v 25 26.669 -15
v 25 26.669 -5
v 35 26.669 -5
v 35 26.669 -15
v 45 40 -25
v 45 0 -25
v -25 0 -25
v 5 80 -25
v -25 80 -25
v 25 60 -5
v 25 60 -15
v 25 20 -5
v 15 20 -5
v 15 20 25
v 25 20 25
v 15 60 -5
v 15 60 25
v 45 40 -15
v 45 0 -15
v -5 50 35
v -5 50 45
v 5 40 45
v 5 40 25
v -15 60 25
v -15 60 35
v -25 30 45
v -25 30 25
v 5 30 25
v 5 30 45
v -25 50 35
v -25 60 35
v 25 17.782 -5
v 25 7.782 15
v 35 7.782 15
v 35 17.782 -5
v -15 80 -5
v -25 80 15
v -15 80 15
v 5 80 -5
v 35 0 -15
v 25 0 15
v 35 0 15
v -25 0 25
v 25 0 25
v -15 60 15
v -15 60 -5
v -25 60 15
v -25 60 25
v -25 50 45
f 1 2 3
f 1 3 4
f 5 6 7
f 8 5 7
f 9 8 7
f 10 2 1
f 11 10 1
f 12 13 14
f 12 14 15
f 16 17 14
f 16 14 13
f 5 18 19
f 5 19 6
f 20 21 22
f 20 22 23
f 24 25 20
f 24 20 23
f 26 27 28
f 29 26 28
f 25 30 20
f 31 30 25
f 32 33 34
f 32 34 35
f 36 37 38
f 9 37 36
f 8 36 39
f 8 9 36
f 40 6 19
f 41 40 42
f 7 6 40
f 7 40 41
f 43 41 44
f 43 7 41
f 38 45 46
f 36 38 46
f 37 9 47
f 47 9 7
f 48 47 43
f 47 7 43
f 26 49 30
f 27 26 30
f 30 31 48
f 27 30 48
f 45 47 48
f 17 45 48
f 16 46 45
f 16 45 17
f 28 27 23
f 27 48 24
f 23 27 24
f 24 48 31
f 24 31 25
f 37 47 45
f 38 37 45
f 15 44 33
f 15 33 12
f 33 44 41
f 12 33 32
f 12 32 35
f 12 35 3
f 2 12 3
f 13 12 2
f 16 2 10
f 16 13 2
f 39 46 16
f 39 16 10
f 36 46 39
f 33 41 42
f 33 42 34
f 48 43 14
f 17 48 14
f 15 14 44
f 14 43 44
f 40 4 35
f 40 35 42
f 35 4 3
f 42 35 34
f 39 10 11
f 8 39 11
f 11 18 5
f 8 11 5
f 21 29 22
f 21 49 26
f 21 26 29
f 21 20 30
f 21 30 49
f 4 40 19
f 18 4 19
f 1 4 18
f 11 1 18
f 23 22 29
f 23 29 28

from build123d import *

# Parameters (mm, degrees)
SKETCH1_W           = 50
SKETCH1_H           = 50
BOSS_EXTRUDE1_DEPTH = 60
SKETCH2_W           = 10
SKETCH2_H           = 30
CUT_EXTRUDE1_DEPTH  = 40
SKETCH3_W           = 30
SKETCH3_H           = 20
BOSS_EXTRUDE2_DEPTH = 30
CHAMFER1_SIZE       = 20
SKETCH4_W           = 10
SKETCH4_H           = 10
CUT_EXTRUDE2_DEPTH  = 40
SKETCH6_W           = 10
SKETCH6_H           = 80
BOSS_EXTRUDE3_DEPTH = 20
BOSS_EXTRUDE4_DEPTH = 20
CHAMFER2_SIZE       = 40
BOSS_EXTRUDE5_DEPTH = 10


with BuildPart() as part:
    # Sketch1 → Boss-Extrude1 (new body)
    with BuildSketch(Plane(origin=(0, 0, 0), x_dir=(1, 0, 0), z_dir=(0, 1, 0))):
        Rectangle(SKETCH1_W, SKETCH1_H)
    extrude(amount=BOSS_EXTRUDE1_DEPTH)

    # Sketch2 → Cut-Extrude1 (cut)
    with BuildSketch(Plane(origin=(0, 60, 0), x_dir=(1, 0, 0), z_dir=(0, 1, 0))):
        with Locations((20, -10)):
            Rectangle(SKETCH2_W, SKETCH2_H)
    extrude(amount=-CUT_EXTRUDE1_DEPTH, mode=Mode.SUBTRACT)

    # Sketch6 → Boss-Extrude3 (add)
    with BuildSketch(Plane(origin=(25, 0, 0), x_dir=(0, 0, -1), z_dir=(1, 0, 0))):
        with Locations((20, 40)):
            Rectangle(SKETCH6_W, SKETCH6_H)
    extrude(amount=BOSS_EXTRUDE3_DEPTH)

    # Sketch7 → Boss-Extrude4 (add)
    with BuildSketch(Plane(origin=(0, 60, 0), x_dir=(1, 0, 0), z_dir=(0, 1, 0))):
        Polygon((-25, -15), (-15, -15), (-15, 5), (25, 5), (25, 15), (25, 25), (-25, 25), align=None)
    extrude(amount=BOSS_EXTRUDE4_DEPTH)

    # Chamfer2
    chamfer2_edges = [part.edges().sort_by_distance(p)[0] for p in [
        (45, 80, -20),
    ]]
    chamfer(chamfer2_edges, length=CHAMFER2_SIZE)

    # Sketch8 → Boss-Extrude5 (add)
    with BuildSketch(Plane(origin=(25, 0, 0), x_dir=(0, 0, -1), z_dir=(1, 0, 0))):
        Polygon((15, 26.66931211), (15, 0), (-15, 0), (-15, 7.782203516), (5, 17.782203516), (5, 26.66931211), align=None)
    extrude(amount=BOSS_EXTRUDE5_DEPTH)


with BuildPart() as body_2:
    # Sketch3 → Boss-Extrude2 (new body)
    with BuildSketch(Plane(origin=(0, 60, 0), x_dir=(1, 0, 0), z_dir=(0, 1, 0))):
        with Locations((-10, -35)):
            Rectangle(SKETCH3_W, SKETCH3_H)
    extrude(amount=-BOSS_EXTRUDE2_DEPTH)

    # Chamfer1
    chamfer1_edges = [body_2.edges().sort_by_distance(p)[0] for p in [
        (5, 60, 35),
    ]]
    chamfer(chamfer1_edges, length=CHAMFER1_SIZE)

    # Sketch4 → Cut-Extrude2 (cut)
    with BuildSketch(Plane.ZY.offset(25)):
        with Locations((40, 55)):
            Rectangle(SKETCH4_W, SKETCH4_H)
    extrude(amount=-CUT_EXTRUDE2_DEPTH, mode=Mode.SUBTRACT)


solid = Compound([part.part, body_2.part])
